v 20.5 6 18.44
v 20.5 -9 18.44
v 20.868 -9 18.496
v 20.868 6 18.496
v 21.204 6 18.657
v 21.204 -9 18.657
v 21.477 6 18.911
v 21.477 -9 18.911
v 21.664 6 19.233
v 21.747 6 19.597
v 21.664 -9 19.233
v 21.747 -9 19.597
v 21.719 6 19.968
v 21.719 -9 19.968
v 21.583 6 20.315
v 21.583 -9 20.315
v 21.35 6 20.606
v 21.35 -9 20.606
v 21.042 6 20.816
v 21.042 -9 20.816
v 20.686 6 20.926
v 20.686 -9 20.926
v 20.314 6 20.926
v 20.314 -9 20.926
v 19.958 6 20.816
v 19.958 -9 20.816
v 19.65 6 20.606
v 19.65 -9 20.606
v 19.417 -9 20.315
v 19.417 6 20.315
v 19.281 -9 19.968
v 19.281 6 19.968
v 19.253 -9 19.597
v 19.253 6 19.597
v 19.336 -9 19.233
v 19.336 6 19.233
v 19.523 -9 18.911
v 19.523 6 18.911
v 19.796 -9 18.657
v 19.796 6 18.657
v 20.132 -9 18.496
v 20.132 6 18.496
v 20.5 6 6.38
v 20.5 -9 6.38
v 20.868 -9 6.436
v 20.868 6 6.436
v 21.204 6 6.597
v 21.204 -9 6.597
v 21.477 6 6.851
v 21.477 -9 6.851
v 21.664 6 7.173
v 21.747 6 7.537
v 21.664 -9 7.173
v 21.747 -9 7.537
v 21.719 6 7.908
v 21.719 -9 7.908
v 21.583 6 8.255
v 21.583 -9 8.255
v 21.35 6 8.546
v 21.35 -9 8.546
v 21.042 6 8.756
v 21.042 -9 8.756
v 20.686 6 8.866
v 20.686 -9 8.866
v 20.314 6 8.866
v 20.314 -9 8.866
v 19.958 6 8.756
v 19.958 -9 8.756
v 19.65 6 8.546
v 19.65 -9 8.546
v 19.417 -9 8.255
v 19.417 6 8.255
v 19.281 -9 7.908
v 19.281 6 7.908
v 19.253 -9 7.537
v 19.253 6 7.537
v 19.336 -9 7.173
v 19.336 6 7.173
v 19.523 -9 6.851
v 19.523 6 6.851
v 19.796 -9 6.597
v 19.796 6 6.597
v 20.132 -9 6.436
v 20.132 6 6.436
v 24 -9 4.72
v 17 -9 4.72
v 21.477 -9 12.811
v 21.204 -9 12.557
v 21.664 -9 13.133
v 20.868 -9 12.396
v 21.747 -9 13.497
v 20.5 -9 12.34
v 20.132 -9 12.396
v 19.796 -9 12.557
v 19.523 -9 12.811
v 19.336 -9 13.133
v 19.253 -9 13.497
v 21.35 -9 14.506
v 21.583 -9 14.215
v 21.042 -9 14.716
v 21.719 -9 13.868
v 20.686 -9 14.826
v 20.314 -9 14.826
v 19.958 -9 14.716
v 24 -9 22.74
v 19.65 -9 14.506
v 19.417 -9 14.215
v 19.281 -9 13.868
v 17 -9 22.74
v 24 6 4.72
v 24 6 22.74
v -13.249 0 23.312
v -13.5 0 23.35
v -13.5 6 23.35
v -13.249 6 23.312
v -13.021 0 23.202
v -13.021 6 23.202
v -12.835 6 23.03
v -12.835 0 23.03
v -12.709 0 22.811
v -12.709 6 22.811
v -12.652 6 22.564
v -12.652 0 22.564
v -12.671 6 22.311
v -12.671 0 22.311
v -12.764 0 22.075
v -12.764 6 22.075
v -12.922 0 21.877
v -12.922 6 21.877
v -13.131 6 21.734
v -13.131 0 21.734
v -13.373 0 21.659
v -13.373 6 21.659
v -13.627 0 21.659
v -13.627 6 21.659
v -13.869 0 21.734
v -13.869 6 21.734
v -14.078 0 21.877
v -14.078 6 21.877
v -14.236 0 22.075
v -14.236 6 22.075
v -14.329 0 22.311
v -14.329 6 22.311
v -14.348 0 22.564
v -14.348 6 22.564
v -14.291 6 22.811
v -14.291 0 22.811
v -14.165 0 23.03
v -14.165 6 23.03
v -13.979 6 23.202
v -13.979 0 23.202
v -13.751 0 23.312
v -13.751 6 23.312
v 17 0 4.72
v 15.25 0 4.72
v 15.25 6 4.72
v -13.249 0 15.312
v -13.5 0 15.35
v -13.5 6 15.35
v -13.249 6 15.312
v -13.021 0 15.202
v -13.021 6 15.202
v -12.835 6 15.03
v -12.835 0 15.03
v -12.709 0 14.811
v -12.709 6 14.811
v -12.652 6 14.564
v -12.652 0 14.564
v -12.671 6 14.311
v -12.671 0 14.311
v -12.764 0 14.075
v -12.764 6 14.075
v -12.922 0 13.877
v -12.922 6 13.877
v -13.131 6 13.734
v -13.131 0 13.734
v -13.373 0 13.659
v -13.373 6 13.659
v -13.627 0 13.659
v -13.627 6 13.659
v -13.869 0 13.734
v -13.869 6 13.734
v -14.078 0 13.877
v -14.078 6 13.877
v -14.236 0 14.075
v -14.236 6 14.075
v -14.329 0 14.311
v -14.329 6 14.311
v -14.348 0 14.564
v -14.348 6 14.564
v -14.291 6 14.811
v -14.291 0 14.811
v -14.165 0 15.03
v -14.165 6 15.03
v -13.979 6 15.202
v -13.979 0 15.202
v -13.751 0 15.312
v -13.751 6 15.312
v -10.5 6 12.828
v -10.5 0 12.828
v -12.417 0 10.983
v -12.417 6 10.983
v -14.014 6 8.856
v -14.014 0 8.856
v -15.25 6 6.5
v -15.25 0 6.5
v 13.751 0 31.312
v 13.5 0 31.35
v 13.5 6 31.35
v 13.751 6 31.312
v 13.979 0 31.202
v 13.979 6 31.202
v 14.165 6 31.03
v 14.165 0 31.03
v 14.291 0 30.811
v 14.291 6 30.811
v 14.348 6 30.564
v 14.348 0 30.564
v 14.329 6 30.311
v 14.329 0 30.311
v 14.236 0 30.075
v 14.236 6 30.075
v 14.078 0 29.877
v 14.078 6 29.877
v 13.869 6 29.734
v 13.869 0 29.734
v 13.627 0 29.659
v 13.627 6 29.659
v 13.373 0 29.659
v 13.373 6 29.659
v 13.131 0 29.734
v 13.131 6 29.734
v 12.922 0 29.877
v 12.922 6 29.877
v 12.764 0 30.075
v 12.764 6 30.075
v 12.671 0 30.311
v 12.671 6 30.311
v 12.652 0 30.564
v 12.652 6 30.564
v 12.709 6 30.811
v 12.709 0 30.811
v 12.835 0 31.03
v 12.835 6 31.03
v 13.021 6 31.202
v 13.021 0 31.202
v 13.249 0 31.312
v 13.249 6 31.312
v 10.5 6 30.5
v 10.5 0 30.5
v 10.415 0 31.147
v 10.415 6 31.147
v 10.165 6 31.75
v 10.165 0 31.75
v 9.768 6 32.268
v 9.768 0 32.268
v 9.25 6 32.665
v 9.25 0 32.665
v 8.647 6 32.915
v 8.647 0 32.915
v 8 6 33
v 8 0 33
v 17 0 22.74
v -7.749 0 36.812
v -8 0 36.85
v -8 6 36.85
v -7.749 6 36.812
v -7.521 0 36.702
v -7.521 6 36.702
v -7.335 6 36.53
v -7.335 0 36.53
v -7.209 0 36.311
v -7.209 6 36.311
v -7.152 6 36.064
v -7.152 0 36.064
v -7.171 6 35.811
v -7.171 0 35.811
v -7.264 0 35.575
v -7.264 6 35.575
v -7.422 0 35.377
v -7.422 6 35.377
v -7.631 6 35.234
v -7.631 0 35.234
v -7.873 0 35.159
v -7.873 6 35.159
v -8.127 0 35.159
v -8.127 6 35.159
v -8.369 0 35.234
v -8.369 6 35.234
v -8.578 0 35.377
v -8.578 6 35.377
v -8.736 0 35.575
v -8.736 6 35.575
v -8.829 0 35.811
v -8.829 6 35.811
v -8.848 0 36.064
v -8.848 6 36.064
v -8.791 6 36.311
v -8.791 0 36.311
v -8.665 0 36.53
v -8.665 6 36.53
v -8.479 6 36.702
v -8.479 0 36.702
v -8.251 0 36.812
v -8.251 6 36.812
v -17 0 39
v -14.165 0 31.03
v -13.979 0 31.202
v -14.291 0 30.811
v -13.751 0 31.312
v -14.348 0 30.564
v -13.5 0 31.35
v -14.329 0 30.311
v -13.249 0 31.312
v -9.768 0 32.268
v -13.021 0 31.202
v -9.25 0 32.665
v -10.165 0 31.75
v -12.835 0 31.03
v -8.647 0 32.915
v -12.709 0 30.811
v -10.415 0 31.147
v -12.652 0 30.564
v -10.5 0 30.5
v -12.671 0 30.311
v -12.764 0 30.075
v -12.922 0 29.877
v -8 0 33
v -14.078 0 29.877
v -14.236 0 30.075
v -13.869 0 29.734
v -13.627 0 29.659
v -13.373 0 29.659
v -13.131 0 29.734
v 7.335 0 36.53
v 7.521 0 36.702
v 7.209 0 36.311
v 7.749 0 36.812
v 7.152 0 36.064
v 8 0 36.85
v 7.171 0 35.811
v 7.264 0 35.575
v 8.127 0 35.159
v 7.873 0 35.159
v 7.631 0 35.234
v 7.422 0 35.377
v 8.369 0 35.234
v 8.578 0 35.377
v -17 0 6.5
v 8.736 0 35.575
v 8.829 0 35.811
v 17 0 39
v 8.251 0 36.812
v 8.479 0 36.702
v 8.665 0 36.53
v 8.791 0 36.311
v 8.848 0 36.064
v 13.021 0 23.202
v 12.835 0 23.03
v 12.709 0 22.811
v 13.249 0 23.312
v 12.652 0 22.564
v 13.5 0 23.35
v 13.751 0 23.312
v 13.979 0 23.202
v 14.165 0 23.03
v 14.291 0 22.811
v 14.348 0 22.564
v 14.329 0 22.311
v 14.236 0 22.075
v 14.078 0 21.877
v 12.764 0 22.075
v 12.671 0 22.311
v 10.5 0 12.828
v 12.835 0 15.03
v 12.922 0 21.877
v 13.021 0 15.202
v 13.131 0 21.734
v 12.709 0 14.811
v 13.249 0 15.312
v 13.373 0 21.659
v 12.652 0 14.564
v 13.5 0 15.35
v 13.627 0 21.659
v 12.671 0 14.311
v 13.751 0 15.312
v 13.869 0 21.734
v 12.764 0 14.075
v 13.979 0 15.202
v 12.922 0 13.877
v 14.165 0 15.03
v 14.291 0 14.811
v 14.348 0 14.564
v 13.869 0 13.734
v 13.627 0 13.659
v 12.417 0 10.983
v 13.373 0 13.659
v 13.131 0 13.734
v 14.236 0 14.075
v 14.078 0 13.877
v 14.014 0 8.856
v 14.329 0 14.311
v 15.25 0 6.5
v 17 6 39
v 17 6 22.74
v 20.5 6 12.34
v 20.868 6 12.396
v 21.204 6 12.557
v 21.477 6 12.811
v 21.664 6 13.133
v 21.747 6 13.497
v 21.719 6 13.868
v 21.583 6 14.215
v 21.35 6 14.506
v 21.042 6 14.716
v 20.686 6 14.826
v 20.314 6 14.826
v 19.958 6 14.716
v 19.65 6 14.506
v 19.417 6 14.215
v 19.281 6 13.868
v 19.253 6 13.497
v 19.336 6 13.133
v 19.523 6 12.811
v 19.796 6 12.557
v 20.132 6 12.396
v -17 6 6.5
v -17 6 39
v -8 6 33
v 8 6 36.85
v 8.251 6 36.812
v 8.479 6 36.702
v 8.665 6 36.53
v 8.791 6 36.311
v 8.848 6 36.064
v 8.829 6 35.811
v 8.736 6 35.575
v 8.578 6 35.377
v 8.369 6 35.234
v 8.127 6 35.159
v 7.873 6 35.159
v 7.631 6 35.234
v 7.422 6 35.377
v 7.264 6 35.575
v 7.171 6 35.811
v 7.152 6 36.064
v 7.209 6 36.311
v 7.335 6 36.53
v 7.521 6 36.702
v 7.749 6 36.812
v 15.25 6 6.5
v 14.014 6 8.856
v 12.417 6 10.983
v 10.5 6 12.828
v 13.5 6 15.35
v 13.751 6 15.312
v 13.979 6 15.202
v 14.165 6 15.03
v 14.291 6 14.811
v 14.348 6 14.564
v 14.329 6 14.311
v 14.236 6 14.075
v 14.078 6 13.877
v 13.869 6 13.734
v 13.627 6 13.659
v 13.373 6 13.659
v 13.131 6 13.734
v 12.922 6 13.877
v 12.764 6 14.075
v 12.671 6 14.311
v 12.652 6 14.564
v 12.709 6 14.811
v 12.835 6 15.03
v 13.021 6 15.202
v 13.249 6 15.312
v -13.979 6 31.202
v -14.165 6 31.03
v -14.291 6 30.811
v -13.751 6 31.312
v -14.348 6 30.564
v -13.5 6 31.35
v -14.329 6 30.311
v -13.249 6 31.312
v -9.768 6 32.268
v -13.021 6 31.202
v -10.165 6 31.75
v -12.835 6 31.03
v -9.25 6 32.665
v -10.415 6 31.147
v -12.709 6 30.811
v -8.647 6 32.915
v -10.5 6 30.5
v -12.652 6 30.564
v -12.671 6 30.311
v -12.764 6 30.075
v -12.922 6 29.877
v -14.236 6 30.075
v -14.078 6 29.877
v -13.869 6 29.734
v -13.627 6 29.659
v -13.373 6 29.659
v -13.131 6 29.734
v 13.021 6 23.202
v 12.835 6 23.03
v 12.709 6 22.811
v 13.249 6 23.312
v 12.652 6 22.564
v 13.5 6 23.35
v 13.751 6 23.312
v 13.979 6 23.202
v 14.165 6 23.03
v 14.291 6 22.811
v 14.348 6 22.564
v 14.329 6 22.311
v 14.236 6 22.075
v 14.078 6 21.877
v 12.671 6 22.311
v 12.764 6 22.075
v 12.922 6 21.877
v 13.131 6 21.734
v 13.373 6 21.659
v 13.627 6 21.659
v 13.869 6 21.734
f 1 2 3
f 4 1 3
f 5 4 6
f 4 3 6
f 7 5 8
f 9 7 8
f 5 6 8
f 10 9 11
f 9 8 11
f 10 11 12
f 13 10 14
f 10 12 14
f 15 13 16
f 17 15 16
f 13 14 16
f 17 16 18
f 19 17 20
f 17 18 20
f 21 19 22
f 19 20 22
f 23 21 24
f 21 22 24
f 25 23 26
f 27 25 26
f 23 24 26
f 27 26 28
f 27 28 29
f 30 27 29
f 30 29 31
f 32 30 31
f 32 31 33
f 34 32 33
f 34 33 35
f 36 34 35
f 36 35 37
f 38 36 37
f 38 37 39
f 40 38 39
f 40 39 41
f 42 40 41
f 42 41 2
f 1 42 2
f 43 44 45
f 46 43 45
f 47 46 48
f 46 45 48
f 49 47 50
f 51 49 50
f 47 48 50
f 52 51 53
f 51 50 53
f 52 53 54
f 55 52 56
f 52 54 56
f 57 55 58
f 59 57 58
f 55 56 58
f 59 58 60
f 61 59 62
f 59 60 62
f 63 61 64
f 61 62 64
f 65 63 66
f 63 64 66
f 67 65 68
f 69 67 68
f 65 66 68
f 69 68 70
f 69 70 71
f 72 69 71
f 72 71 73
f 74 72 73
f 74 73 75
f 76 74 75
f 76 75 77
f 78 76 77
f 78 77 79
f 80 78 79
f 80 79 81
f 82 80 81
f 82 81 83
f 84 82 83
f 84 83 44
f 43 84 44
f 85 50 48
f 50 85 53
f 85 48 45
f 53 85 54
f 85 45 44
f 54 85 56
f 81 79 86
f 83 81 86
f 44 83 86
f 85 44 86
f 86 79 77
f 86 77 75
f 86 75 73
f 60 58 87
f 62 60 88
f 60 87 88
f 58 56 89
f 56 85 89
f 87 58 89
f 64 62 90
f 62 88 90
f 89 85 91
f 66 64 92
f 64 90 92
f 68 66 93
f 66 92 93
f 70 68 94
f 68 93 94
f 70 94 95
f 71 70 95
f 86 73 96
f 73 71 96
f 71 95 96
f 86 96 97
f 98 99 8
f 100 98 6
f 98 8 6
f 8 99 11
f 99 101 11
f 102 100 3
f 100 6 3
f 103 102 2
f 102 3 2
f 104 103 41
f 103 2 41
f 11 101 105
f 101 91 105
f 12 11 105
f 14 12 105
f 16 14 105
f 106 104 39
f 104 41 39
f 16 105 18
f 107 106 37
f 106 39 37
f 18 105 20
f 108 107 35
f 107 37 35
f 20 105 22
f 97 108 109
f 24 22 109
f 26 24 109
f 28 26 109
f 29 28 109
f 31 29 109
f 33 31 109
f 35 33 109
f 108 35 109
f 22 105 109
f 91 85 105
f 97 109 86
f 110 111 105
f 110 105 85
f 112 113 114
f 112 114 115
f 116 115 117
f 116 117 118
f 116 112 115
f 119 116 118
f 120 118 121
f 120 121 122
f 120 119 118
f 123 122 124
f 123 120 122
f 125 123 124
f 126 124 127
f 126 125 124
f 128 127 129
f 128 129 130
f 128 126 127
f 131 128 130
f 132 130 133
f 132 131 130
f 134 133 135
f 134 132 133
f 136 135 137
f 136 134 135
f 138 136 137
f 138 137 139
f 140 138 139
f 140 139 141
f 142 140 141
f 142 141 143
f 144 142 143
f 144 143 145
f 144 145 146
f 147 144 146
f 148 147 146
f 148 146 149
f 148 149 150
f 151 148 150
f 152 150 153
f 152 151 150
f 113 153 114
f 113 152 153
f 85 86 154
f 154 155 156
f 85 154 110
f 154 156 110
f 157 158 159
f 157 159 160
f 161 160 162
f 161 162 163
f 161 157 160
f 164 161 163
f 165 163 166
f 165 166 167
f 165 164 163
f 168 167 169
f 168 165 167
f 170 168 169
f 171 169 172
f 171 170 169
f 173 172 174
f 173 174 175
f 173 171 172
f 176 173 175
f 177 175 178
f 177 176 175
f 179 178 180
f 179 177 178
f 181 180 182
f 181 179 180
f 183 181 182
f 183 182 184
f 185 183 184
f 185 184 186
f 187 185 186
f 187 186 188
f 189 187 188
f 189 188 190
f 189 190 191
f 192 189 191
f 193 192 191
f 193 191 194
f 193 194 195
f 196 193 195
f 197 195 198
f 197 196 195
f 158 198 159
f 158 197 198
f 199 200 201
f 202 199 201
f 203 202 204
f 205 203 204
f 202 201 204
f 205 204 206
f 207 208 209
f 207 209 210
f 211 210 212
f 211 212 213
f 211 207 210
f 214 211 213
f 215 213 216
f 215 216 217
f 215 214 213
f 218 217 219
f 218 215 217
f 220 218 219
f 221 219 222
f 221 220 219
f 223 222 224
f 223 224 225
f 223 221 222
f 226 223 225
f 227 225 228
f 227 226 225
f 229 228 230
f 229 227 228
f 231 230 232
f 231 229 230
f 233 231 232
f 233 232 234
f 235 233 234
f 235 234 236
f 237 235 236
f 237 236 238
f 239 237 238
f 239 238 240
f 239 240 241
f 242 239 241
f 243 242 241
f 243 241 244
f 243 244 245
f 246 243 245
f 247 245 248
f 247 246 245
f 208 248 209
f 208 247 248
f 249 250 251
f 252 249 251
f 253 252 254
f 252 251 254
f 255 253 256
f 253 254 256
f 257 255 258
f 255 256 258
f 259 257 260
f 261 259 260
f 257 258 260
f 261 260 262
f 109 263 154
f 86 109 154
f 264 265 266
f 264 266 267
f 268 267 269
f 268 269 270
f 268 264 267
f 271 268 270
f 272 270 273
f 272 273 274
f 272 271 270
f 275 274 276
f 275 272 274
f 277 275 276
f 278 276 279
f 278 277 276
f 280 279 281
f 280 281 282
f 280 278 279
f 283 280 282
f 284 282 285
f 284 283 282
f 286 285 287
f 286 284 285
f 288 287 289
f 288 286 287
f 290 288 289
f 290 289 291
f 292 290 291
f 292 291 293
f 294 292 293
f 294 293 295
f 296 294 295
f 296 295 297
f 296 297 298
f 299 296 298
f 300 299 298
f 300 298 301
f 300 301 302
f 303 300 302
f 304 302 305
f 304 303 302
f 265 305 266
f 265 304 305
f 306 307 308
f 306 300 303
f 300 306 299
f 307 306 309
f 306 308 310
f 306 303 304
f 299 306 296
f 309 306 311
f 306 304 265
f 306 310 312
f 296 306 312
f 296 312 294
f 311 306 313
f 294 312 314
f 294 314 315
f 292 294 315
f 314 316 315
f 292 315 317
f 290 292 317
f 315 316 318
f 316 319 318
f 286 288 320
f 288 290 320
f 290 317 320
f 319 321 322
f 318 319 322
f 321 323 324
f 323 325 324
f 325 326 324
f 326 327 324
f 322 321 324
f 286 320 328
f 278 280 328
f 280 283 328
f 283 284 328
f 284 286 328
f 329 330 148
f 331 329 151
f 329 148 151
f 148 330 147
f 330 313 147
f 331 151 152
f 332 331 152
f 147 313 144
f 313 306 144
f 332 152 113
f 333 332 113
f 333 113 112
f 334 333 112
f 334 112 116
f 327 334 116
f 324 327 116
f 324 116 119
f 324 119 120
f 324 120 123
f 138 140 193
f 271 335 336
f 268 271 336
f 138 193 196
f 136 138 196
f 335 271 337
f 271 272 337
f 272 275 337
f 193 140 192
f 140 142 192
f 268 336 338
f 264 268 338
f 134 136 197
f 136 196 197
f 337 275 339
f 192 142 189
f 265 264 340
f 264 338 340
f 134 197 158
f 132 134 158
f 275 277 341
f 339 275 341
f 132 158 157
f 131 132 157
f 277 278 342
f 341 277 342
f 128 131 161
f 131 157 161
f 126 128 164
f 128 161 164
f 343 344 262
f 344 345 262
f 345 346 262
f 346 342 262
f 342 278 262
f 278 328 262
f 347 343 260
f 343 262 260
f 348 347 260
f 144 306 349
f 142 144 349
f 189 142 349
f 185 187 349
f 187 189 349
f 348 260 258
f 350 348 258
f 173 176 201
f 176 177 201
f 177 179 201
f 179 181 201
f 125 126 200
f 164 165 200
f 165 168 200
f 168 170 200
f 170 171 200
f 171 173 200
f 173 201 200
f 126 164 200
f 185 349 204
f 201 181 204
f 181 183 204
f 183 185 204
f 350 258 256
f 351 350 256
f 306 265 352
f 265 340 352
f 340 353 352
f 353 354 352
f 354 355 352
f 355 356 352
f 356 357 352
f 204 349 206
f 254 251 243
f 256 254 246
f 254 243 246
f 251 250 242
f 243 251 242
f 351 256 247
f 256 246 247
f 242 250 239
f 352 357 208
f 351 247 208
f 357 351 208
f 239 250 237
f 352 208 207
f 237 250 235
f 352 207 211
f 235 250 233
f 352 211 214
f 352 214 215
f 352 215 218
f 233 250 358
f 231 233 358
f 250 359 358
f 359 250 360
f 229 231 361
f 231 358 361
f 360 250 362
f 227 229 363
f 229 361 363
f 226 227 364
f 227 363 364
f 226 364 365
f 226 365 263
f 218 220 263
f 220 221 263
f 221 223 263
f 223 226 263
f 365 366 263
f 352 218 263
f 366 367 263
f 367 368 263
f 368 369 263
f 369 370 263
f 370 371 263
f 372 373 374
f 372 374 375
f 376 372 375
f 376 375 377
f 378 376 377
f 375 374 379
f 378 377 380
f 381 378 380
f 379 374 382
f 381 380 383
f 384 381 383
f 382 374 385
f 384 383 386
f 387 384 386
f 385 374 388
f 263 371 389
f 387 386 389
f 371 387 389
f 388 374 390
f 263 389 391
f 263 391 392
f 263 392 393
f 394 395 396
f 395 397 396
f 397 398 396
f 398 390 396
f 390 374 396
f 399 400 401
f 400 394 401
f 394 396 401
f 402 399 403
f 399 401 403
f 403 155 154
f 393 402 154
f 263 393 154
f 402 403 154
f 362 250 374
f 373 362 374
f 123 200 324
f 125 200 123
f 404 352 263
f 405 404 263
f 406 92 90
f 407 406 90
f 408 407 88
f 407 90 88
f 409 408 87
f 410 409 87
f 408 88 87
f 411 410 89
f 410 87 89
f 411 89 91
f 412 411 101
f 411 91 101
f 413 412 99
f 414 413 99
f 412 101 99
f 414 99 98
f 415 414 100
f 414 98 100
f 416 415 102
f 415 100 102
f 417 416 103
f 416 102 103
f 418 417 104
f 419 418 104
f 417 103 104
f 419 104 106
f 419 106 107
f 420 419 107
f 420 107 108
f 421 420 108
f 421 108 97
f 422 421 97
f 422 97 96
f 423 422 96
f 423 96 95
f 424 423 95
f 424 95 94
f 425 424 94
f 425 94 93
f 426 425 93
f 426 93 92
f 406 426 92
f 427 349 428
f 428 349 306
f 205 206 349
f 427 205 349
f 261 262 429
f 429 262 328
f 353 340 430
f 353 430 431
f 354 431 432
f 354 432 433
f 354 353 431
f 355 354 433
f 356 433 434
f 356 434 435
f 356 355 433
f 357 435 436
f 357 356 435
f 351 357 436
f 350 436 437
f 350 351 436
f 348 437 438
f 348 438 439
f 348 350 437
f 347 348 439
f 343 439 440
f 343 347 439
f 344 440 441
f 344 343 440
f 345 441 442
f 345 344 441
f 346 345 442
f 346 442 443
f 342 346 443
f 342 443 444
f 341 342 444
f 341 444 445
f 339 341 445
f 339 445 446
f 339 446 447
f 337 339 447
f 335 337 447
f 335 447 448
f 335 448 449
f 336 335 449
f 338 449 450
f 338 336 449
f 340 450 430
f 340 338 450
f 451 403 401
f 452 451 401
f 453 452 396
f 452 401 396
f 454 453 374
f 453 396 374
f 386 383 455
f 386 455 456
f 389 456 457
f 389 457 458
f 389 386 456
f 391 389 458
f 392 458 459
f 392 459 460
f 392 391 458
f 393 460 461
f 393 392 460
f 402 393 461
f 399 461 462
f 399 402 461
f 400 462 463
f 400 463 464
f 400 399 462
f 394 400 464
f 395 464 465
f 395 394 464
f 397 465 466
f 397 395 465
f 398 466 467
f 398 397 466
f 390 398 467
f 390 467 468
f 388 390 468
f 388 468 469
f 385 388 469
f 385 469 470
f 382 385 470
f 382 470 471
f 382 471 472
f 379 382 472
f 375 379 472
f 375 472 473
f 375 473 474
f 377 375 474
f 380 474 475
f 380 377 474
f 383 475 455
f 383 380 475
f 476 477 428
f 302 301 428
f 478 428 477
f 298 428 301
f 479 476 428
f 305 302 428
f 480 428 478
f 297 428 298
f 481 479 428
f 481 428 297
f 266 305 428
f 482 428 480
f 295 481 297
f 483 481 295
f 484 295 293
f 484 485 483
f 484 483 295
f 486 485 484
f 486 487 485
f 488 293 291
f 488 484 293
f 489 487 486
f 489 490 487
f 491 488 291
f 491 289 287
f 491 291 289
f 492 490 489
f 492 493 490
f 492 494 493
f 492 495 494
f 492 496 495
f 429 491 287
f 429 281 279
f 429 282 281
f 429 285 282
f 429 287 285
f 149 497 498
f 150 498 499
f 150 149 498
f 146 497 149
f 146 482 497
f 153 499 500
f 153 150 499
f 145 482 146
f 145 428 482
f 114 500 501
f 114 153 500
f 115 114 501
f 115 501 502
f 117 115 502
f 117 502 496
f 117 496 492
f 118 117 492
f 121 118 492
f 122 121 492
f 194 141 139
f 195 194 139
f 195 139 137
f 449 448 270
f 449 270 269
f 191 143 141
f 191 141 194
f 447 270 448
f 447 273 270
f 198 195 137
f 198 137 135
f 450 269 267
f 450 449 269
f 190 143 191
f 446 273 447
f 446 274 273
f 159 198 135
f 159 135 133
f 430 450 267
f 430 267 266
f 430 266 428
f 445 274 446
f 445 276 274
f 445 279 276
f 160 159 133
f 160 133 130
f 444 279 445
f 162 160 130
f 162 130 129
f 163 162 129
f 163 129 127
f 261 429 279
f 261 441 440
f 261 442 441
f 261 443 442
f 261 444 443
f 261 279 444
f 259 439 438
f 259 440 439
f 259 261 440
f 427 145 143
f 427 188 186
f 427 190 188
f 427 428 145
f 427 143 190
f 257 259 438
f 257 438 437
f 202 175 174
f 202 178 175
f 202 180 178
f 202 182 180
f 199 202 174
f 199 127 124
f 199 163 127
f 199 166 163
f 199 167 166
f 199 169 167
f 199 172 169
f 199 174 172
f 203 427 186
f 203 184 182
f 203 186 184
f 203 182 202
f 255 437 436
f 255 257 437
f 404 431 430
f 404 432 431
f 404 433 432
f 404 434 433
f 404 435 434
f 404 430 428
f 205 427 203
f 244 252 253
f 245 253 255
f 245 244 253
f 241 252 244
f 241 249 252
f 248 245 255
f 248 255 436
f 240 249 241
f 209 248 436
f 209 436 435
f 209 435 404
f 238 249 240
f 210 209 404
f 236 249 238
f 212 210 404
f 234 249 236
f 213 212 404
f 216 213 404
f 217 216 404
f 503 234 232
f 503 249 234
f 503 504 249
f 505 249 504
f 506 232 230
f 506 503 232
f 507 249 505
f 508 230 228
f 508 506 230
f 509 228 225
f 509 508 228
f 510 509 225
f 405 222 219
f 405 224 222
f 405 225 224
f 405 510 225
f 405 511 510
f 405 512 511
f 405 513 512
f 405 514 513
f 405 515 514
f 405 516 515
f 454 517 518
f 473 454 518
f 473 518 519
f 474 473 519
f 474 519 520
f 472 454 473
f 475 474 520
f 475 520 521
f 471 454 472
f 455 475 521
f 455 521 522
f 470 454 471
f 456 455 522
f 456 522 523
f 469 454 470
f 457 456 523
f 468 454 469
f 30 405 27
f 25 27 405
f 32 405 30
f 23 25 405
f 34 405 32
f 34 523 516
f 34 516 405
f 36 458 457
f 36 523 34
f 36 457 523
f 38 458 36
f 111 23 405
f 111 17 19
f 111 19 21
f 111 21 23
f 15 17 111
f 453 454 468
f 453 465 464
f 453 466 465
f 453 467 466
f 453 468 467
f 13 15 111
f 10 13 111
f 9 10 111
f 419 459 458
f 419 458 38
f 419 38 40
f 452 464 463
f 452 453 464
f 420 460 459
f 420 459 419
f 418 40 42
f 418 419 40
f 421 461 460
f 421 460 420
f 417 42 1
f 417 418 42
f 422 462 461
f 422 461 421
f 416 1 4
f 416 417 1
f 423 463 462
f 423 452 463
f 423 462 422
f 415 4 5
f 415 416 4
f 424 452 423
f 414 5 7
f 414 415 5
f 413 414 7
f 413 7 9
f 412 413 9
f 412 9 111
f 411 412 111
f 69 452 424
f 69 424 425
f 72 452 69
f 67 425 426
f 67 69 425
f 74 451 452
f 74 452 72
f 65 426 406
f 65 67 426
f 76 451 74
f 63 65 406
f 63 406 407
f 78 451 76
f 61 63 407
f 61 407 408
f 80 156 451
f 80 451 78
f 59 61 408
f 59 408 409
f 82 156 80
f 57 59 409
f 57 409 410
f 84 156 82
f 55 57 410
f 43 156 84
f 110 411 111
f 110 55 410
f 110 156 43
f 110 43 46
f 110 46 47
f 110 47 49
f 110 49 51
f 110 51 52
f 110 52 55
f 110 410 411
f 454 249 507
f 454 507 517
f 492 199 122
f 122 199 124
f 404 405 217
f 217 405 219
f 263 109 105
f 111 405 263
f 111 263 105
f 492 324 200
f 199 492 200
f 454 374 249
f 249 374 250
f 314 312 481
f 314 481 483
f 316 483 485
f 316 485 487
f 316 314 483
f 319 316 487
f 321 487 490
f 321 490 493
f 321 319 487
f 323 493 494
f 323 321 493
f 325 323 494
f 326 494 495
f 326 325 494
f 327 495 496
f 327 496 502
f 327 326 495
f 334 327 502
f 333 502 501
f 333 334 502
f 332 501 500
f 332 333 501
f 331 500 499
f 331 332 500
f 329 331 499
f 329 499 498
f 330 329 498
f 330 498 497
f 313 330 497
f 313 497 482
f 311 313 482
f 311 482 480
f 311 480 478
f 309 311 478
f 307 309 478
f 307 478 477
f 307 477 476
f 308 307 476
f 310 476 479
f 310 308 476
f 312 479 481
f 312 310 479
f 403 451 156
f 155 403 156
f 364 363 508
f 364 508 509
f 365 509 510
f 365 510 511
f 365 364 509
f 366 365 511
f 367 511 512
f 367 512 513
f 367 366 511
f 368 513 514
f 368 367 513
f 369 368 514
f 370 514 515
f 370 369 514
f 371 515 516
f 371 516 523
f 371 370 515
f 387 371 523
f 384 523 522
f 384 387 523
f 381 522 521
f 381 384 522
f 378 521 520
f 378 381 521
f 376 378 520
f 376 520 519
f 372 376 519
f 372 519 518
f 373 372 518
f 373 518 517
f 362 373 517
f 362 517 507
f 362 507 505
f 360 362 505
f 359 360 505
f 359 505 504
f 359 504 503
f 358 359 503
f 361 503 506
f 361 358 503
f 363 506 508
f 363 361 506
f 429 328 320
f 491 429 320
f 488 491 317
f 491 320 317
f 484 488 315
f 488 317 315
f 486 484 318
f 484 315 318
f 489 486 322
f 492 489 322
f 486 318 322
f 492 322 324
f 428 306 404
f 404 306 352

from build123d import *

# Parameters (mm, degrees)
SKETCH1_R                = 0.85
BOSS_EXTRUDE1_DEPTH      = 6
BOSS_EXTRUDE2_DEPTH      = 9
BOSS_EXTRUDE2_DEPTH_BACK = 6
SKETCH4_R                = 1.25
CUT_EXTRUDE2_DEPTH       = 49.187135213
CUT_EXTRUDE3_DEPTH       = 10
SKETCH7_W                = 1.75
SKETCH7_H                = 1.78
BOSS_EXTRUDE4_DEPTH      = 6


with BuildPart() as part:
    # Sketch1 → Boss-Extrude1 (new body)
    with BuildSketch(Plane(origin=(0, 0, 0), x_dir=(1, 0, 0), z_dir=(0, 1, 0))):
        with BuildLine():
            Line((-17, -6.5), (-17, -33.5))
            Line((-17, -33.5), (-17, -39))
            Line((-17, -39), (17, -39))
            Line((17, -39), (17, -33.5))
            Line((17, -33.5), (17, -6.5))
            Line((17, -6.5), (15.25, -6.5))
            ThreePointArc((15.25, -6.5), (13.258096668, -9.951651759), (10.5, -12.828191611))
            Line((10.5, -12.828191611), (10.5, -30.5))
            Line((10.5, -30.5), (8, -30.5))
            Line((8, -30.5), (8, -33))
            Line((8, -33), (-8, -33))
            Line((-8, -33), (-8, -30.5))
            Line((-8, -30.5), (-10.5, -30.5))
            Line((-10.5, -30.5), (-10.5, -12.828191611))
            ThreePointArc((-10.5, -12.828191611), (-13.258096668, -9.951651759), (-15.25, -6.5))
            Line((-15.25, -6.5), (-17, -6.5))
        make_face()
        with Locations(Location((-13.5, -30.5, 0), (0, 0, 270))):
            Circle(SKETCH1_R, mode=Mode.SUBTRACT)
        with Locations(Location((-13.5, -22.5, 0), (0, 0, 270))):
            Circle(SKETCH1_R, mode=Mode.SUBTRACT)
        with Locations(Location((-13.5, -14.5, 0), (0, 0, 270))):
            Circle(SKETCH1_R, mode=Mode.SUBTRACT)
        with Locations(Location((-8, -36, 0), (0, 0, 270))):
            Circle(SKETCH1_R, mode=Mode.SUBTRACT)
        with Locations(Location((8, -36, 0), (0, 0, 270))):
            Circle(SKETCH1_R, mode=Mode.SUBTRACT)
        with Locations(Location((13.5, -30.5, 0), (0, 0, 270))):
            Circle(SKETCH1_R, mode=Mode.SUBTRACT)
        with Locations(Location((13.5, -22.5, 0), (0, 0, 270))):
            Circle(SKETCH1_R, mode=Mode.SUBTRACT)
        with Locations(Location((13.5, -14.5, 0), (0, 0, 270))):
            Circle(SKETCH1_R, mode=Mode.SUBTRACT)
    extrude(amount=BOSS_EXTRUDE1_DEPTH)

    # Sketch3 → Boss-Extrude2 (add, two sides: drawn at the far end of the back side and taken through both)
    with BuildSketch(Plane.XZ.offset(-BOSS_EXTRUDE2_DEPTH_BACK)):
        Polygon((17, 22.74), (24, 22.74), (24, 4.72), (17, 4.72), (17, 7.901808389), align=None)
    extrude(amount=BOSS_EXTRUDE2_DEPTH + BOSS_EXTRUDE2_DEPTH_BACK)

    # Sketch4 → Cut-Extrude2 (cut, through all)
    with BuildSketch(Plane.XZ.offset(9)):
        with Locations(Location((20.5, 7.63, 0), (0, 0, 270))):
            Circle(SKETCH4_R)
        with Locations(Location((20.5, 13.59, 0), (0, 0, 270))):
            Circle(SKETCH4_R)
        with Locations(Location((20.5, 19.69, 0), (0, 0, 270))):
            Circle(SKETCH4_R)
    extrude(amount=-CUT_EXTRUDE2_DEPTH, mode=Mode.SUBTRACT)

    # Sketch5 → Cut-Extrude3 (cut)
    with BuildSketch(Plane.XZ):
        with BuildLine():
            Line((8, 33), (-8, 33))
            ThreePointArc((-8, 33), (-9.767766953, 32.267766953), (-10.5, 30.5))
            Line((-10.5, 30.5), (10.5, 30.5))
            ThreePointArc((10.5, 30.5), (9.767766953, 32.267766953), (8, 33))
        make_face()
    extrude(amount=-CUT_EXTRUDE3_DEPTH, mode=Mode.SUBTRACT)

    # Sketch7 → Boss-Extrude4 (add)
    with BuildSketch(Plane(origin=(0, 6, 0), x_dir=(1, 0, 0), z_dir=(0, 1, 0))):
        with Locations((16.125, -5.61)):
            Rectangle(SKETCH7_W, SKETCH7_H)
    extrude(amount=-BOSS_EXTRUDE4_DEPTH)


solid = part.part
